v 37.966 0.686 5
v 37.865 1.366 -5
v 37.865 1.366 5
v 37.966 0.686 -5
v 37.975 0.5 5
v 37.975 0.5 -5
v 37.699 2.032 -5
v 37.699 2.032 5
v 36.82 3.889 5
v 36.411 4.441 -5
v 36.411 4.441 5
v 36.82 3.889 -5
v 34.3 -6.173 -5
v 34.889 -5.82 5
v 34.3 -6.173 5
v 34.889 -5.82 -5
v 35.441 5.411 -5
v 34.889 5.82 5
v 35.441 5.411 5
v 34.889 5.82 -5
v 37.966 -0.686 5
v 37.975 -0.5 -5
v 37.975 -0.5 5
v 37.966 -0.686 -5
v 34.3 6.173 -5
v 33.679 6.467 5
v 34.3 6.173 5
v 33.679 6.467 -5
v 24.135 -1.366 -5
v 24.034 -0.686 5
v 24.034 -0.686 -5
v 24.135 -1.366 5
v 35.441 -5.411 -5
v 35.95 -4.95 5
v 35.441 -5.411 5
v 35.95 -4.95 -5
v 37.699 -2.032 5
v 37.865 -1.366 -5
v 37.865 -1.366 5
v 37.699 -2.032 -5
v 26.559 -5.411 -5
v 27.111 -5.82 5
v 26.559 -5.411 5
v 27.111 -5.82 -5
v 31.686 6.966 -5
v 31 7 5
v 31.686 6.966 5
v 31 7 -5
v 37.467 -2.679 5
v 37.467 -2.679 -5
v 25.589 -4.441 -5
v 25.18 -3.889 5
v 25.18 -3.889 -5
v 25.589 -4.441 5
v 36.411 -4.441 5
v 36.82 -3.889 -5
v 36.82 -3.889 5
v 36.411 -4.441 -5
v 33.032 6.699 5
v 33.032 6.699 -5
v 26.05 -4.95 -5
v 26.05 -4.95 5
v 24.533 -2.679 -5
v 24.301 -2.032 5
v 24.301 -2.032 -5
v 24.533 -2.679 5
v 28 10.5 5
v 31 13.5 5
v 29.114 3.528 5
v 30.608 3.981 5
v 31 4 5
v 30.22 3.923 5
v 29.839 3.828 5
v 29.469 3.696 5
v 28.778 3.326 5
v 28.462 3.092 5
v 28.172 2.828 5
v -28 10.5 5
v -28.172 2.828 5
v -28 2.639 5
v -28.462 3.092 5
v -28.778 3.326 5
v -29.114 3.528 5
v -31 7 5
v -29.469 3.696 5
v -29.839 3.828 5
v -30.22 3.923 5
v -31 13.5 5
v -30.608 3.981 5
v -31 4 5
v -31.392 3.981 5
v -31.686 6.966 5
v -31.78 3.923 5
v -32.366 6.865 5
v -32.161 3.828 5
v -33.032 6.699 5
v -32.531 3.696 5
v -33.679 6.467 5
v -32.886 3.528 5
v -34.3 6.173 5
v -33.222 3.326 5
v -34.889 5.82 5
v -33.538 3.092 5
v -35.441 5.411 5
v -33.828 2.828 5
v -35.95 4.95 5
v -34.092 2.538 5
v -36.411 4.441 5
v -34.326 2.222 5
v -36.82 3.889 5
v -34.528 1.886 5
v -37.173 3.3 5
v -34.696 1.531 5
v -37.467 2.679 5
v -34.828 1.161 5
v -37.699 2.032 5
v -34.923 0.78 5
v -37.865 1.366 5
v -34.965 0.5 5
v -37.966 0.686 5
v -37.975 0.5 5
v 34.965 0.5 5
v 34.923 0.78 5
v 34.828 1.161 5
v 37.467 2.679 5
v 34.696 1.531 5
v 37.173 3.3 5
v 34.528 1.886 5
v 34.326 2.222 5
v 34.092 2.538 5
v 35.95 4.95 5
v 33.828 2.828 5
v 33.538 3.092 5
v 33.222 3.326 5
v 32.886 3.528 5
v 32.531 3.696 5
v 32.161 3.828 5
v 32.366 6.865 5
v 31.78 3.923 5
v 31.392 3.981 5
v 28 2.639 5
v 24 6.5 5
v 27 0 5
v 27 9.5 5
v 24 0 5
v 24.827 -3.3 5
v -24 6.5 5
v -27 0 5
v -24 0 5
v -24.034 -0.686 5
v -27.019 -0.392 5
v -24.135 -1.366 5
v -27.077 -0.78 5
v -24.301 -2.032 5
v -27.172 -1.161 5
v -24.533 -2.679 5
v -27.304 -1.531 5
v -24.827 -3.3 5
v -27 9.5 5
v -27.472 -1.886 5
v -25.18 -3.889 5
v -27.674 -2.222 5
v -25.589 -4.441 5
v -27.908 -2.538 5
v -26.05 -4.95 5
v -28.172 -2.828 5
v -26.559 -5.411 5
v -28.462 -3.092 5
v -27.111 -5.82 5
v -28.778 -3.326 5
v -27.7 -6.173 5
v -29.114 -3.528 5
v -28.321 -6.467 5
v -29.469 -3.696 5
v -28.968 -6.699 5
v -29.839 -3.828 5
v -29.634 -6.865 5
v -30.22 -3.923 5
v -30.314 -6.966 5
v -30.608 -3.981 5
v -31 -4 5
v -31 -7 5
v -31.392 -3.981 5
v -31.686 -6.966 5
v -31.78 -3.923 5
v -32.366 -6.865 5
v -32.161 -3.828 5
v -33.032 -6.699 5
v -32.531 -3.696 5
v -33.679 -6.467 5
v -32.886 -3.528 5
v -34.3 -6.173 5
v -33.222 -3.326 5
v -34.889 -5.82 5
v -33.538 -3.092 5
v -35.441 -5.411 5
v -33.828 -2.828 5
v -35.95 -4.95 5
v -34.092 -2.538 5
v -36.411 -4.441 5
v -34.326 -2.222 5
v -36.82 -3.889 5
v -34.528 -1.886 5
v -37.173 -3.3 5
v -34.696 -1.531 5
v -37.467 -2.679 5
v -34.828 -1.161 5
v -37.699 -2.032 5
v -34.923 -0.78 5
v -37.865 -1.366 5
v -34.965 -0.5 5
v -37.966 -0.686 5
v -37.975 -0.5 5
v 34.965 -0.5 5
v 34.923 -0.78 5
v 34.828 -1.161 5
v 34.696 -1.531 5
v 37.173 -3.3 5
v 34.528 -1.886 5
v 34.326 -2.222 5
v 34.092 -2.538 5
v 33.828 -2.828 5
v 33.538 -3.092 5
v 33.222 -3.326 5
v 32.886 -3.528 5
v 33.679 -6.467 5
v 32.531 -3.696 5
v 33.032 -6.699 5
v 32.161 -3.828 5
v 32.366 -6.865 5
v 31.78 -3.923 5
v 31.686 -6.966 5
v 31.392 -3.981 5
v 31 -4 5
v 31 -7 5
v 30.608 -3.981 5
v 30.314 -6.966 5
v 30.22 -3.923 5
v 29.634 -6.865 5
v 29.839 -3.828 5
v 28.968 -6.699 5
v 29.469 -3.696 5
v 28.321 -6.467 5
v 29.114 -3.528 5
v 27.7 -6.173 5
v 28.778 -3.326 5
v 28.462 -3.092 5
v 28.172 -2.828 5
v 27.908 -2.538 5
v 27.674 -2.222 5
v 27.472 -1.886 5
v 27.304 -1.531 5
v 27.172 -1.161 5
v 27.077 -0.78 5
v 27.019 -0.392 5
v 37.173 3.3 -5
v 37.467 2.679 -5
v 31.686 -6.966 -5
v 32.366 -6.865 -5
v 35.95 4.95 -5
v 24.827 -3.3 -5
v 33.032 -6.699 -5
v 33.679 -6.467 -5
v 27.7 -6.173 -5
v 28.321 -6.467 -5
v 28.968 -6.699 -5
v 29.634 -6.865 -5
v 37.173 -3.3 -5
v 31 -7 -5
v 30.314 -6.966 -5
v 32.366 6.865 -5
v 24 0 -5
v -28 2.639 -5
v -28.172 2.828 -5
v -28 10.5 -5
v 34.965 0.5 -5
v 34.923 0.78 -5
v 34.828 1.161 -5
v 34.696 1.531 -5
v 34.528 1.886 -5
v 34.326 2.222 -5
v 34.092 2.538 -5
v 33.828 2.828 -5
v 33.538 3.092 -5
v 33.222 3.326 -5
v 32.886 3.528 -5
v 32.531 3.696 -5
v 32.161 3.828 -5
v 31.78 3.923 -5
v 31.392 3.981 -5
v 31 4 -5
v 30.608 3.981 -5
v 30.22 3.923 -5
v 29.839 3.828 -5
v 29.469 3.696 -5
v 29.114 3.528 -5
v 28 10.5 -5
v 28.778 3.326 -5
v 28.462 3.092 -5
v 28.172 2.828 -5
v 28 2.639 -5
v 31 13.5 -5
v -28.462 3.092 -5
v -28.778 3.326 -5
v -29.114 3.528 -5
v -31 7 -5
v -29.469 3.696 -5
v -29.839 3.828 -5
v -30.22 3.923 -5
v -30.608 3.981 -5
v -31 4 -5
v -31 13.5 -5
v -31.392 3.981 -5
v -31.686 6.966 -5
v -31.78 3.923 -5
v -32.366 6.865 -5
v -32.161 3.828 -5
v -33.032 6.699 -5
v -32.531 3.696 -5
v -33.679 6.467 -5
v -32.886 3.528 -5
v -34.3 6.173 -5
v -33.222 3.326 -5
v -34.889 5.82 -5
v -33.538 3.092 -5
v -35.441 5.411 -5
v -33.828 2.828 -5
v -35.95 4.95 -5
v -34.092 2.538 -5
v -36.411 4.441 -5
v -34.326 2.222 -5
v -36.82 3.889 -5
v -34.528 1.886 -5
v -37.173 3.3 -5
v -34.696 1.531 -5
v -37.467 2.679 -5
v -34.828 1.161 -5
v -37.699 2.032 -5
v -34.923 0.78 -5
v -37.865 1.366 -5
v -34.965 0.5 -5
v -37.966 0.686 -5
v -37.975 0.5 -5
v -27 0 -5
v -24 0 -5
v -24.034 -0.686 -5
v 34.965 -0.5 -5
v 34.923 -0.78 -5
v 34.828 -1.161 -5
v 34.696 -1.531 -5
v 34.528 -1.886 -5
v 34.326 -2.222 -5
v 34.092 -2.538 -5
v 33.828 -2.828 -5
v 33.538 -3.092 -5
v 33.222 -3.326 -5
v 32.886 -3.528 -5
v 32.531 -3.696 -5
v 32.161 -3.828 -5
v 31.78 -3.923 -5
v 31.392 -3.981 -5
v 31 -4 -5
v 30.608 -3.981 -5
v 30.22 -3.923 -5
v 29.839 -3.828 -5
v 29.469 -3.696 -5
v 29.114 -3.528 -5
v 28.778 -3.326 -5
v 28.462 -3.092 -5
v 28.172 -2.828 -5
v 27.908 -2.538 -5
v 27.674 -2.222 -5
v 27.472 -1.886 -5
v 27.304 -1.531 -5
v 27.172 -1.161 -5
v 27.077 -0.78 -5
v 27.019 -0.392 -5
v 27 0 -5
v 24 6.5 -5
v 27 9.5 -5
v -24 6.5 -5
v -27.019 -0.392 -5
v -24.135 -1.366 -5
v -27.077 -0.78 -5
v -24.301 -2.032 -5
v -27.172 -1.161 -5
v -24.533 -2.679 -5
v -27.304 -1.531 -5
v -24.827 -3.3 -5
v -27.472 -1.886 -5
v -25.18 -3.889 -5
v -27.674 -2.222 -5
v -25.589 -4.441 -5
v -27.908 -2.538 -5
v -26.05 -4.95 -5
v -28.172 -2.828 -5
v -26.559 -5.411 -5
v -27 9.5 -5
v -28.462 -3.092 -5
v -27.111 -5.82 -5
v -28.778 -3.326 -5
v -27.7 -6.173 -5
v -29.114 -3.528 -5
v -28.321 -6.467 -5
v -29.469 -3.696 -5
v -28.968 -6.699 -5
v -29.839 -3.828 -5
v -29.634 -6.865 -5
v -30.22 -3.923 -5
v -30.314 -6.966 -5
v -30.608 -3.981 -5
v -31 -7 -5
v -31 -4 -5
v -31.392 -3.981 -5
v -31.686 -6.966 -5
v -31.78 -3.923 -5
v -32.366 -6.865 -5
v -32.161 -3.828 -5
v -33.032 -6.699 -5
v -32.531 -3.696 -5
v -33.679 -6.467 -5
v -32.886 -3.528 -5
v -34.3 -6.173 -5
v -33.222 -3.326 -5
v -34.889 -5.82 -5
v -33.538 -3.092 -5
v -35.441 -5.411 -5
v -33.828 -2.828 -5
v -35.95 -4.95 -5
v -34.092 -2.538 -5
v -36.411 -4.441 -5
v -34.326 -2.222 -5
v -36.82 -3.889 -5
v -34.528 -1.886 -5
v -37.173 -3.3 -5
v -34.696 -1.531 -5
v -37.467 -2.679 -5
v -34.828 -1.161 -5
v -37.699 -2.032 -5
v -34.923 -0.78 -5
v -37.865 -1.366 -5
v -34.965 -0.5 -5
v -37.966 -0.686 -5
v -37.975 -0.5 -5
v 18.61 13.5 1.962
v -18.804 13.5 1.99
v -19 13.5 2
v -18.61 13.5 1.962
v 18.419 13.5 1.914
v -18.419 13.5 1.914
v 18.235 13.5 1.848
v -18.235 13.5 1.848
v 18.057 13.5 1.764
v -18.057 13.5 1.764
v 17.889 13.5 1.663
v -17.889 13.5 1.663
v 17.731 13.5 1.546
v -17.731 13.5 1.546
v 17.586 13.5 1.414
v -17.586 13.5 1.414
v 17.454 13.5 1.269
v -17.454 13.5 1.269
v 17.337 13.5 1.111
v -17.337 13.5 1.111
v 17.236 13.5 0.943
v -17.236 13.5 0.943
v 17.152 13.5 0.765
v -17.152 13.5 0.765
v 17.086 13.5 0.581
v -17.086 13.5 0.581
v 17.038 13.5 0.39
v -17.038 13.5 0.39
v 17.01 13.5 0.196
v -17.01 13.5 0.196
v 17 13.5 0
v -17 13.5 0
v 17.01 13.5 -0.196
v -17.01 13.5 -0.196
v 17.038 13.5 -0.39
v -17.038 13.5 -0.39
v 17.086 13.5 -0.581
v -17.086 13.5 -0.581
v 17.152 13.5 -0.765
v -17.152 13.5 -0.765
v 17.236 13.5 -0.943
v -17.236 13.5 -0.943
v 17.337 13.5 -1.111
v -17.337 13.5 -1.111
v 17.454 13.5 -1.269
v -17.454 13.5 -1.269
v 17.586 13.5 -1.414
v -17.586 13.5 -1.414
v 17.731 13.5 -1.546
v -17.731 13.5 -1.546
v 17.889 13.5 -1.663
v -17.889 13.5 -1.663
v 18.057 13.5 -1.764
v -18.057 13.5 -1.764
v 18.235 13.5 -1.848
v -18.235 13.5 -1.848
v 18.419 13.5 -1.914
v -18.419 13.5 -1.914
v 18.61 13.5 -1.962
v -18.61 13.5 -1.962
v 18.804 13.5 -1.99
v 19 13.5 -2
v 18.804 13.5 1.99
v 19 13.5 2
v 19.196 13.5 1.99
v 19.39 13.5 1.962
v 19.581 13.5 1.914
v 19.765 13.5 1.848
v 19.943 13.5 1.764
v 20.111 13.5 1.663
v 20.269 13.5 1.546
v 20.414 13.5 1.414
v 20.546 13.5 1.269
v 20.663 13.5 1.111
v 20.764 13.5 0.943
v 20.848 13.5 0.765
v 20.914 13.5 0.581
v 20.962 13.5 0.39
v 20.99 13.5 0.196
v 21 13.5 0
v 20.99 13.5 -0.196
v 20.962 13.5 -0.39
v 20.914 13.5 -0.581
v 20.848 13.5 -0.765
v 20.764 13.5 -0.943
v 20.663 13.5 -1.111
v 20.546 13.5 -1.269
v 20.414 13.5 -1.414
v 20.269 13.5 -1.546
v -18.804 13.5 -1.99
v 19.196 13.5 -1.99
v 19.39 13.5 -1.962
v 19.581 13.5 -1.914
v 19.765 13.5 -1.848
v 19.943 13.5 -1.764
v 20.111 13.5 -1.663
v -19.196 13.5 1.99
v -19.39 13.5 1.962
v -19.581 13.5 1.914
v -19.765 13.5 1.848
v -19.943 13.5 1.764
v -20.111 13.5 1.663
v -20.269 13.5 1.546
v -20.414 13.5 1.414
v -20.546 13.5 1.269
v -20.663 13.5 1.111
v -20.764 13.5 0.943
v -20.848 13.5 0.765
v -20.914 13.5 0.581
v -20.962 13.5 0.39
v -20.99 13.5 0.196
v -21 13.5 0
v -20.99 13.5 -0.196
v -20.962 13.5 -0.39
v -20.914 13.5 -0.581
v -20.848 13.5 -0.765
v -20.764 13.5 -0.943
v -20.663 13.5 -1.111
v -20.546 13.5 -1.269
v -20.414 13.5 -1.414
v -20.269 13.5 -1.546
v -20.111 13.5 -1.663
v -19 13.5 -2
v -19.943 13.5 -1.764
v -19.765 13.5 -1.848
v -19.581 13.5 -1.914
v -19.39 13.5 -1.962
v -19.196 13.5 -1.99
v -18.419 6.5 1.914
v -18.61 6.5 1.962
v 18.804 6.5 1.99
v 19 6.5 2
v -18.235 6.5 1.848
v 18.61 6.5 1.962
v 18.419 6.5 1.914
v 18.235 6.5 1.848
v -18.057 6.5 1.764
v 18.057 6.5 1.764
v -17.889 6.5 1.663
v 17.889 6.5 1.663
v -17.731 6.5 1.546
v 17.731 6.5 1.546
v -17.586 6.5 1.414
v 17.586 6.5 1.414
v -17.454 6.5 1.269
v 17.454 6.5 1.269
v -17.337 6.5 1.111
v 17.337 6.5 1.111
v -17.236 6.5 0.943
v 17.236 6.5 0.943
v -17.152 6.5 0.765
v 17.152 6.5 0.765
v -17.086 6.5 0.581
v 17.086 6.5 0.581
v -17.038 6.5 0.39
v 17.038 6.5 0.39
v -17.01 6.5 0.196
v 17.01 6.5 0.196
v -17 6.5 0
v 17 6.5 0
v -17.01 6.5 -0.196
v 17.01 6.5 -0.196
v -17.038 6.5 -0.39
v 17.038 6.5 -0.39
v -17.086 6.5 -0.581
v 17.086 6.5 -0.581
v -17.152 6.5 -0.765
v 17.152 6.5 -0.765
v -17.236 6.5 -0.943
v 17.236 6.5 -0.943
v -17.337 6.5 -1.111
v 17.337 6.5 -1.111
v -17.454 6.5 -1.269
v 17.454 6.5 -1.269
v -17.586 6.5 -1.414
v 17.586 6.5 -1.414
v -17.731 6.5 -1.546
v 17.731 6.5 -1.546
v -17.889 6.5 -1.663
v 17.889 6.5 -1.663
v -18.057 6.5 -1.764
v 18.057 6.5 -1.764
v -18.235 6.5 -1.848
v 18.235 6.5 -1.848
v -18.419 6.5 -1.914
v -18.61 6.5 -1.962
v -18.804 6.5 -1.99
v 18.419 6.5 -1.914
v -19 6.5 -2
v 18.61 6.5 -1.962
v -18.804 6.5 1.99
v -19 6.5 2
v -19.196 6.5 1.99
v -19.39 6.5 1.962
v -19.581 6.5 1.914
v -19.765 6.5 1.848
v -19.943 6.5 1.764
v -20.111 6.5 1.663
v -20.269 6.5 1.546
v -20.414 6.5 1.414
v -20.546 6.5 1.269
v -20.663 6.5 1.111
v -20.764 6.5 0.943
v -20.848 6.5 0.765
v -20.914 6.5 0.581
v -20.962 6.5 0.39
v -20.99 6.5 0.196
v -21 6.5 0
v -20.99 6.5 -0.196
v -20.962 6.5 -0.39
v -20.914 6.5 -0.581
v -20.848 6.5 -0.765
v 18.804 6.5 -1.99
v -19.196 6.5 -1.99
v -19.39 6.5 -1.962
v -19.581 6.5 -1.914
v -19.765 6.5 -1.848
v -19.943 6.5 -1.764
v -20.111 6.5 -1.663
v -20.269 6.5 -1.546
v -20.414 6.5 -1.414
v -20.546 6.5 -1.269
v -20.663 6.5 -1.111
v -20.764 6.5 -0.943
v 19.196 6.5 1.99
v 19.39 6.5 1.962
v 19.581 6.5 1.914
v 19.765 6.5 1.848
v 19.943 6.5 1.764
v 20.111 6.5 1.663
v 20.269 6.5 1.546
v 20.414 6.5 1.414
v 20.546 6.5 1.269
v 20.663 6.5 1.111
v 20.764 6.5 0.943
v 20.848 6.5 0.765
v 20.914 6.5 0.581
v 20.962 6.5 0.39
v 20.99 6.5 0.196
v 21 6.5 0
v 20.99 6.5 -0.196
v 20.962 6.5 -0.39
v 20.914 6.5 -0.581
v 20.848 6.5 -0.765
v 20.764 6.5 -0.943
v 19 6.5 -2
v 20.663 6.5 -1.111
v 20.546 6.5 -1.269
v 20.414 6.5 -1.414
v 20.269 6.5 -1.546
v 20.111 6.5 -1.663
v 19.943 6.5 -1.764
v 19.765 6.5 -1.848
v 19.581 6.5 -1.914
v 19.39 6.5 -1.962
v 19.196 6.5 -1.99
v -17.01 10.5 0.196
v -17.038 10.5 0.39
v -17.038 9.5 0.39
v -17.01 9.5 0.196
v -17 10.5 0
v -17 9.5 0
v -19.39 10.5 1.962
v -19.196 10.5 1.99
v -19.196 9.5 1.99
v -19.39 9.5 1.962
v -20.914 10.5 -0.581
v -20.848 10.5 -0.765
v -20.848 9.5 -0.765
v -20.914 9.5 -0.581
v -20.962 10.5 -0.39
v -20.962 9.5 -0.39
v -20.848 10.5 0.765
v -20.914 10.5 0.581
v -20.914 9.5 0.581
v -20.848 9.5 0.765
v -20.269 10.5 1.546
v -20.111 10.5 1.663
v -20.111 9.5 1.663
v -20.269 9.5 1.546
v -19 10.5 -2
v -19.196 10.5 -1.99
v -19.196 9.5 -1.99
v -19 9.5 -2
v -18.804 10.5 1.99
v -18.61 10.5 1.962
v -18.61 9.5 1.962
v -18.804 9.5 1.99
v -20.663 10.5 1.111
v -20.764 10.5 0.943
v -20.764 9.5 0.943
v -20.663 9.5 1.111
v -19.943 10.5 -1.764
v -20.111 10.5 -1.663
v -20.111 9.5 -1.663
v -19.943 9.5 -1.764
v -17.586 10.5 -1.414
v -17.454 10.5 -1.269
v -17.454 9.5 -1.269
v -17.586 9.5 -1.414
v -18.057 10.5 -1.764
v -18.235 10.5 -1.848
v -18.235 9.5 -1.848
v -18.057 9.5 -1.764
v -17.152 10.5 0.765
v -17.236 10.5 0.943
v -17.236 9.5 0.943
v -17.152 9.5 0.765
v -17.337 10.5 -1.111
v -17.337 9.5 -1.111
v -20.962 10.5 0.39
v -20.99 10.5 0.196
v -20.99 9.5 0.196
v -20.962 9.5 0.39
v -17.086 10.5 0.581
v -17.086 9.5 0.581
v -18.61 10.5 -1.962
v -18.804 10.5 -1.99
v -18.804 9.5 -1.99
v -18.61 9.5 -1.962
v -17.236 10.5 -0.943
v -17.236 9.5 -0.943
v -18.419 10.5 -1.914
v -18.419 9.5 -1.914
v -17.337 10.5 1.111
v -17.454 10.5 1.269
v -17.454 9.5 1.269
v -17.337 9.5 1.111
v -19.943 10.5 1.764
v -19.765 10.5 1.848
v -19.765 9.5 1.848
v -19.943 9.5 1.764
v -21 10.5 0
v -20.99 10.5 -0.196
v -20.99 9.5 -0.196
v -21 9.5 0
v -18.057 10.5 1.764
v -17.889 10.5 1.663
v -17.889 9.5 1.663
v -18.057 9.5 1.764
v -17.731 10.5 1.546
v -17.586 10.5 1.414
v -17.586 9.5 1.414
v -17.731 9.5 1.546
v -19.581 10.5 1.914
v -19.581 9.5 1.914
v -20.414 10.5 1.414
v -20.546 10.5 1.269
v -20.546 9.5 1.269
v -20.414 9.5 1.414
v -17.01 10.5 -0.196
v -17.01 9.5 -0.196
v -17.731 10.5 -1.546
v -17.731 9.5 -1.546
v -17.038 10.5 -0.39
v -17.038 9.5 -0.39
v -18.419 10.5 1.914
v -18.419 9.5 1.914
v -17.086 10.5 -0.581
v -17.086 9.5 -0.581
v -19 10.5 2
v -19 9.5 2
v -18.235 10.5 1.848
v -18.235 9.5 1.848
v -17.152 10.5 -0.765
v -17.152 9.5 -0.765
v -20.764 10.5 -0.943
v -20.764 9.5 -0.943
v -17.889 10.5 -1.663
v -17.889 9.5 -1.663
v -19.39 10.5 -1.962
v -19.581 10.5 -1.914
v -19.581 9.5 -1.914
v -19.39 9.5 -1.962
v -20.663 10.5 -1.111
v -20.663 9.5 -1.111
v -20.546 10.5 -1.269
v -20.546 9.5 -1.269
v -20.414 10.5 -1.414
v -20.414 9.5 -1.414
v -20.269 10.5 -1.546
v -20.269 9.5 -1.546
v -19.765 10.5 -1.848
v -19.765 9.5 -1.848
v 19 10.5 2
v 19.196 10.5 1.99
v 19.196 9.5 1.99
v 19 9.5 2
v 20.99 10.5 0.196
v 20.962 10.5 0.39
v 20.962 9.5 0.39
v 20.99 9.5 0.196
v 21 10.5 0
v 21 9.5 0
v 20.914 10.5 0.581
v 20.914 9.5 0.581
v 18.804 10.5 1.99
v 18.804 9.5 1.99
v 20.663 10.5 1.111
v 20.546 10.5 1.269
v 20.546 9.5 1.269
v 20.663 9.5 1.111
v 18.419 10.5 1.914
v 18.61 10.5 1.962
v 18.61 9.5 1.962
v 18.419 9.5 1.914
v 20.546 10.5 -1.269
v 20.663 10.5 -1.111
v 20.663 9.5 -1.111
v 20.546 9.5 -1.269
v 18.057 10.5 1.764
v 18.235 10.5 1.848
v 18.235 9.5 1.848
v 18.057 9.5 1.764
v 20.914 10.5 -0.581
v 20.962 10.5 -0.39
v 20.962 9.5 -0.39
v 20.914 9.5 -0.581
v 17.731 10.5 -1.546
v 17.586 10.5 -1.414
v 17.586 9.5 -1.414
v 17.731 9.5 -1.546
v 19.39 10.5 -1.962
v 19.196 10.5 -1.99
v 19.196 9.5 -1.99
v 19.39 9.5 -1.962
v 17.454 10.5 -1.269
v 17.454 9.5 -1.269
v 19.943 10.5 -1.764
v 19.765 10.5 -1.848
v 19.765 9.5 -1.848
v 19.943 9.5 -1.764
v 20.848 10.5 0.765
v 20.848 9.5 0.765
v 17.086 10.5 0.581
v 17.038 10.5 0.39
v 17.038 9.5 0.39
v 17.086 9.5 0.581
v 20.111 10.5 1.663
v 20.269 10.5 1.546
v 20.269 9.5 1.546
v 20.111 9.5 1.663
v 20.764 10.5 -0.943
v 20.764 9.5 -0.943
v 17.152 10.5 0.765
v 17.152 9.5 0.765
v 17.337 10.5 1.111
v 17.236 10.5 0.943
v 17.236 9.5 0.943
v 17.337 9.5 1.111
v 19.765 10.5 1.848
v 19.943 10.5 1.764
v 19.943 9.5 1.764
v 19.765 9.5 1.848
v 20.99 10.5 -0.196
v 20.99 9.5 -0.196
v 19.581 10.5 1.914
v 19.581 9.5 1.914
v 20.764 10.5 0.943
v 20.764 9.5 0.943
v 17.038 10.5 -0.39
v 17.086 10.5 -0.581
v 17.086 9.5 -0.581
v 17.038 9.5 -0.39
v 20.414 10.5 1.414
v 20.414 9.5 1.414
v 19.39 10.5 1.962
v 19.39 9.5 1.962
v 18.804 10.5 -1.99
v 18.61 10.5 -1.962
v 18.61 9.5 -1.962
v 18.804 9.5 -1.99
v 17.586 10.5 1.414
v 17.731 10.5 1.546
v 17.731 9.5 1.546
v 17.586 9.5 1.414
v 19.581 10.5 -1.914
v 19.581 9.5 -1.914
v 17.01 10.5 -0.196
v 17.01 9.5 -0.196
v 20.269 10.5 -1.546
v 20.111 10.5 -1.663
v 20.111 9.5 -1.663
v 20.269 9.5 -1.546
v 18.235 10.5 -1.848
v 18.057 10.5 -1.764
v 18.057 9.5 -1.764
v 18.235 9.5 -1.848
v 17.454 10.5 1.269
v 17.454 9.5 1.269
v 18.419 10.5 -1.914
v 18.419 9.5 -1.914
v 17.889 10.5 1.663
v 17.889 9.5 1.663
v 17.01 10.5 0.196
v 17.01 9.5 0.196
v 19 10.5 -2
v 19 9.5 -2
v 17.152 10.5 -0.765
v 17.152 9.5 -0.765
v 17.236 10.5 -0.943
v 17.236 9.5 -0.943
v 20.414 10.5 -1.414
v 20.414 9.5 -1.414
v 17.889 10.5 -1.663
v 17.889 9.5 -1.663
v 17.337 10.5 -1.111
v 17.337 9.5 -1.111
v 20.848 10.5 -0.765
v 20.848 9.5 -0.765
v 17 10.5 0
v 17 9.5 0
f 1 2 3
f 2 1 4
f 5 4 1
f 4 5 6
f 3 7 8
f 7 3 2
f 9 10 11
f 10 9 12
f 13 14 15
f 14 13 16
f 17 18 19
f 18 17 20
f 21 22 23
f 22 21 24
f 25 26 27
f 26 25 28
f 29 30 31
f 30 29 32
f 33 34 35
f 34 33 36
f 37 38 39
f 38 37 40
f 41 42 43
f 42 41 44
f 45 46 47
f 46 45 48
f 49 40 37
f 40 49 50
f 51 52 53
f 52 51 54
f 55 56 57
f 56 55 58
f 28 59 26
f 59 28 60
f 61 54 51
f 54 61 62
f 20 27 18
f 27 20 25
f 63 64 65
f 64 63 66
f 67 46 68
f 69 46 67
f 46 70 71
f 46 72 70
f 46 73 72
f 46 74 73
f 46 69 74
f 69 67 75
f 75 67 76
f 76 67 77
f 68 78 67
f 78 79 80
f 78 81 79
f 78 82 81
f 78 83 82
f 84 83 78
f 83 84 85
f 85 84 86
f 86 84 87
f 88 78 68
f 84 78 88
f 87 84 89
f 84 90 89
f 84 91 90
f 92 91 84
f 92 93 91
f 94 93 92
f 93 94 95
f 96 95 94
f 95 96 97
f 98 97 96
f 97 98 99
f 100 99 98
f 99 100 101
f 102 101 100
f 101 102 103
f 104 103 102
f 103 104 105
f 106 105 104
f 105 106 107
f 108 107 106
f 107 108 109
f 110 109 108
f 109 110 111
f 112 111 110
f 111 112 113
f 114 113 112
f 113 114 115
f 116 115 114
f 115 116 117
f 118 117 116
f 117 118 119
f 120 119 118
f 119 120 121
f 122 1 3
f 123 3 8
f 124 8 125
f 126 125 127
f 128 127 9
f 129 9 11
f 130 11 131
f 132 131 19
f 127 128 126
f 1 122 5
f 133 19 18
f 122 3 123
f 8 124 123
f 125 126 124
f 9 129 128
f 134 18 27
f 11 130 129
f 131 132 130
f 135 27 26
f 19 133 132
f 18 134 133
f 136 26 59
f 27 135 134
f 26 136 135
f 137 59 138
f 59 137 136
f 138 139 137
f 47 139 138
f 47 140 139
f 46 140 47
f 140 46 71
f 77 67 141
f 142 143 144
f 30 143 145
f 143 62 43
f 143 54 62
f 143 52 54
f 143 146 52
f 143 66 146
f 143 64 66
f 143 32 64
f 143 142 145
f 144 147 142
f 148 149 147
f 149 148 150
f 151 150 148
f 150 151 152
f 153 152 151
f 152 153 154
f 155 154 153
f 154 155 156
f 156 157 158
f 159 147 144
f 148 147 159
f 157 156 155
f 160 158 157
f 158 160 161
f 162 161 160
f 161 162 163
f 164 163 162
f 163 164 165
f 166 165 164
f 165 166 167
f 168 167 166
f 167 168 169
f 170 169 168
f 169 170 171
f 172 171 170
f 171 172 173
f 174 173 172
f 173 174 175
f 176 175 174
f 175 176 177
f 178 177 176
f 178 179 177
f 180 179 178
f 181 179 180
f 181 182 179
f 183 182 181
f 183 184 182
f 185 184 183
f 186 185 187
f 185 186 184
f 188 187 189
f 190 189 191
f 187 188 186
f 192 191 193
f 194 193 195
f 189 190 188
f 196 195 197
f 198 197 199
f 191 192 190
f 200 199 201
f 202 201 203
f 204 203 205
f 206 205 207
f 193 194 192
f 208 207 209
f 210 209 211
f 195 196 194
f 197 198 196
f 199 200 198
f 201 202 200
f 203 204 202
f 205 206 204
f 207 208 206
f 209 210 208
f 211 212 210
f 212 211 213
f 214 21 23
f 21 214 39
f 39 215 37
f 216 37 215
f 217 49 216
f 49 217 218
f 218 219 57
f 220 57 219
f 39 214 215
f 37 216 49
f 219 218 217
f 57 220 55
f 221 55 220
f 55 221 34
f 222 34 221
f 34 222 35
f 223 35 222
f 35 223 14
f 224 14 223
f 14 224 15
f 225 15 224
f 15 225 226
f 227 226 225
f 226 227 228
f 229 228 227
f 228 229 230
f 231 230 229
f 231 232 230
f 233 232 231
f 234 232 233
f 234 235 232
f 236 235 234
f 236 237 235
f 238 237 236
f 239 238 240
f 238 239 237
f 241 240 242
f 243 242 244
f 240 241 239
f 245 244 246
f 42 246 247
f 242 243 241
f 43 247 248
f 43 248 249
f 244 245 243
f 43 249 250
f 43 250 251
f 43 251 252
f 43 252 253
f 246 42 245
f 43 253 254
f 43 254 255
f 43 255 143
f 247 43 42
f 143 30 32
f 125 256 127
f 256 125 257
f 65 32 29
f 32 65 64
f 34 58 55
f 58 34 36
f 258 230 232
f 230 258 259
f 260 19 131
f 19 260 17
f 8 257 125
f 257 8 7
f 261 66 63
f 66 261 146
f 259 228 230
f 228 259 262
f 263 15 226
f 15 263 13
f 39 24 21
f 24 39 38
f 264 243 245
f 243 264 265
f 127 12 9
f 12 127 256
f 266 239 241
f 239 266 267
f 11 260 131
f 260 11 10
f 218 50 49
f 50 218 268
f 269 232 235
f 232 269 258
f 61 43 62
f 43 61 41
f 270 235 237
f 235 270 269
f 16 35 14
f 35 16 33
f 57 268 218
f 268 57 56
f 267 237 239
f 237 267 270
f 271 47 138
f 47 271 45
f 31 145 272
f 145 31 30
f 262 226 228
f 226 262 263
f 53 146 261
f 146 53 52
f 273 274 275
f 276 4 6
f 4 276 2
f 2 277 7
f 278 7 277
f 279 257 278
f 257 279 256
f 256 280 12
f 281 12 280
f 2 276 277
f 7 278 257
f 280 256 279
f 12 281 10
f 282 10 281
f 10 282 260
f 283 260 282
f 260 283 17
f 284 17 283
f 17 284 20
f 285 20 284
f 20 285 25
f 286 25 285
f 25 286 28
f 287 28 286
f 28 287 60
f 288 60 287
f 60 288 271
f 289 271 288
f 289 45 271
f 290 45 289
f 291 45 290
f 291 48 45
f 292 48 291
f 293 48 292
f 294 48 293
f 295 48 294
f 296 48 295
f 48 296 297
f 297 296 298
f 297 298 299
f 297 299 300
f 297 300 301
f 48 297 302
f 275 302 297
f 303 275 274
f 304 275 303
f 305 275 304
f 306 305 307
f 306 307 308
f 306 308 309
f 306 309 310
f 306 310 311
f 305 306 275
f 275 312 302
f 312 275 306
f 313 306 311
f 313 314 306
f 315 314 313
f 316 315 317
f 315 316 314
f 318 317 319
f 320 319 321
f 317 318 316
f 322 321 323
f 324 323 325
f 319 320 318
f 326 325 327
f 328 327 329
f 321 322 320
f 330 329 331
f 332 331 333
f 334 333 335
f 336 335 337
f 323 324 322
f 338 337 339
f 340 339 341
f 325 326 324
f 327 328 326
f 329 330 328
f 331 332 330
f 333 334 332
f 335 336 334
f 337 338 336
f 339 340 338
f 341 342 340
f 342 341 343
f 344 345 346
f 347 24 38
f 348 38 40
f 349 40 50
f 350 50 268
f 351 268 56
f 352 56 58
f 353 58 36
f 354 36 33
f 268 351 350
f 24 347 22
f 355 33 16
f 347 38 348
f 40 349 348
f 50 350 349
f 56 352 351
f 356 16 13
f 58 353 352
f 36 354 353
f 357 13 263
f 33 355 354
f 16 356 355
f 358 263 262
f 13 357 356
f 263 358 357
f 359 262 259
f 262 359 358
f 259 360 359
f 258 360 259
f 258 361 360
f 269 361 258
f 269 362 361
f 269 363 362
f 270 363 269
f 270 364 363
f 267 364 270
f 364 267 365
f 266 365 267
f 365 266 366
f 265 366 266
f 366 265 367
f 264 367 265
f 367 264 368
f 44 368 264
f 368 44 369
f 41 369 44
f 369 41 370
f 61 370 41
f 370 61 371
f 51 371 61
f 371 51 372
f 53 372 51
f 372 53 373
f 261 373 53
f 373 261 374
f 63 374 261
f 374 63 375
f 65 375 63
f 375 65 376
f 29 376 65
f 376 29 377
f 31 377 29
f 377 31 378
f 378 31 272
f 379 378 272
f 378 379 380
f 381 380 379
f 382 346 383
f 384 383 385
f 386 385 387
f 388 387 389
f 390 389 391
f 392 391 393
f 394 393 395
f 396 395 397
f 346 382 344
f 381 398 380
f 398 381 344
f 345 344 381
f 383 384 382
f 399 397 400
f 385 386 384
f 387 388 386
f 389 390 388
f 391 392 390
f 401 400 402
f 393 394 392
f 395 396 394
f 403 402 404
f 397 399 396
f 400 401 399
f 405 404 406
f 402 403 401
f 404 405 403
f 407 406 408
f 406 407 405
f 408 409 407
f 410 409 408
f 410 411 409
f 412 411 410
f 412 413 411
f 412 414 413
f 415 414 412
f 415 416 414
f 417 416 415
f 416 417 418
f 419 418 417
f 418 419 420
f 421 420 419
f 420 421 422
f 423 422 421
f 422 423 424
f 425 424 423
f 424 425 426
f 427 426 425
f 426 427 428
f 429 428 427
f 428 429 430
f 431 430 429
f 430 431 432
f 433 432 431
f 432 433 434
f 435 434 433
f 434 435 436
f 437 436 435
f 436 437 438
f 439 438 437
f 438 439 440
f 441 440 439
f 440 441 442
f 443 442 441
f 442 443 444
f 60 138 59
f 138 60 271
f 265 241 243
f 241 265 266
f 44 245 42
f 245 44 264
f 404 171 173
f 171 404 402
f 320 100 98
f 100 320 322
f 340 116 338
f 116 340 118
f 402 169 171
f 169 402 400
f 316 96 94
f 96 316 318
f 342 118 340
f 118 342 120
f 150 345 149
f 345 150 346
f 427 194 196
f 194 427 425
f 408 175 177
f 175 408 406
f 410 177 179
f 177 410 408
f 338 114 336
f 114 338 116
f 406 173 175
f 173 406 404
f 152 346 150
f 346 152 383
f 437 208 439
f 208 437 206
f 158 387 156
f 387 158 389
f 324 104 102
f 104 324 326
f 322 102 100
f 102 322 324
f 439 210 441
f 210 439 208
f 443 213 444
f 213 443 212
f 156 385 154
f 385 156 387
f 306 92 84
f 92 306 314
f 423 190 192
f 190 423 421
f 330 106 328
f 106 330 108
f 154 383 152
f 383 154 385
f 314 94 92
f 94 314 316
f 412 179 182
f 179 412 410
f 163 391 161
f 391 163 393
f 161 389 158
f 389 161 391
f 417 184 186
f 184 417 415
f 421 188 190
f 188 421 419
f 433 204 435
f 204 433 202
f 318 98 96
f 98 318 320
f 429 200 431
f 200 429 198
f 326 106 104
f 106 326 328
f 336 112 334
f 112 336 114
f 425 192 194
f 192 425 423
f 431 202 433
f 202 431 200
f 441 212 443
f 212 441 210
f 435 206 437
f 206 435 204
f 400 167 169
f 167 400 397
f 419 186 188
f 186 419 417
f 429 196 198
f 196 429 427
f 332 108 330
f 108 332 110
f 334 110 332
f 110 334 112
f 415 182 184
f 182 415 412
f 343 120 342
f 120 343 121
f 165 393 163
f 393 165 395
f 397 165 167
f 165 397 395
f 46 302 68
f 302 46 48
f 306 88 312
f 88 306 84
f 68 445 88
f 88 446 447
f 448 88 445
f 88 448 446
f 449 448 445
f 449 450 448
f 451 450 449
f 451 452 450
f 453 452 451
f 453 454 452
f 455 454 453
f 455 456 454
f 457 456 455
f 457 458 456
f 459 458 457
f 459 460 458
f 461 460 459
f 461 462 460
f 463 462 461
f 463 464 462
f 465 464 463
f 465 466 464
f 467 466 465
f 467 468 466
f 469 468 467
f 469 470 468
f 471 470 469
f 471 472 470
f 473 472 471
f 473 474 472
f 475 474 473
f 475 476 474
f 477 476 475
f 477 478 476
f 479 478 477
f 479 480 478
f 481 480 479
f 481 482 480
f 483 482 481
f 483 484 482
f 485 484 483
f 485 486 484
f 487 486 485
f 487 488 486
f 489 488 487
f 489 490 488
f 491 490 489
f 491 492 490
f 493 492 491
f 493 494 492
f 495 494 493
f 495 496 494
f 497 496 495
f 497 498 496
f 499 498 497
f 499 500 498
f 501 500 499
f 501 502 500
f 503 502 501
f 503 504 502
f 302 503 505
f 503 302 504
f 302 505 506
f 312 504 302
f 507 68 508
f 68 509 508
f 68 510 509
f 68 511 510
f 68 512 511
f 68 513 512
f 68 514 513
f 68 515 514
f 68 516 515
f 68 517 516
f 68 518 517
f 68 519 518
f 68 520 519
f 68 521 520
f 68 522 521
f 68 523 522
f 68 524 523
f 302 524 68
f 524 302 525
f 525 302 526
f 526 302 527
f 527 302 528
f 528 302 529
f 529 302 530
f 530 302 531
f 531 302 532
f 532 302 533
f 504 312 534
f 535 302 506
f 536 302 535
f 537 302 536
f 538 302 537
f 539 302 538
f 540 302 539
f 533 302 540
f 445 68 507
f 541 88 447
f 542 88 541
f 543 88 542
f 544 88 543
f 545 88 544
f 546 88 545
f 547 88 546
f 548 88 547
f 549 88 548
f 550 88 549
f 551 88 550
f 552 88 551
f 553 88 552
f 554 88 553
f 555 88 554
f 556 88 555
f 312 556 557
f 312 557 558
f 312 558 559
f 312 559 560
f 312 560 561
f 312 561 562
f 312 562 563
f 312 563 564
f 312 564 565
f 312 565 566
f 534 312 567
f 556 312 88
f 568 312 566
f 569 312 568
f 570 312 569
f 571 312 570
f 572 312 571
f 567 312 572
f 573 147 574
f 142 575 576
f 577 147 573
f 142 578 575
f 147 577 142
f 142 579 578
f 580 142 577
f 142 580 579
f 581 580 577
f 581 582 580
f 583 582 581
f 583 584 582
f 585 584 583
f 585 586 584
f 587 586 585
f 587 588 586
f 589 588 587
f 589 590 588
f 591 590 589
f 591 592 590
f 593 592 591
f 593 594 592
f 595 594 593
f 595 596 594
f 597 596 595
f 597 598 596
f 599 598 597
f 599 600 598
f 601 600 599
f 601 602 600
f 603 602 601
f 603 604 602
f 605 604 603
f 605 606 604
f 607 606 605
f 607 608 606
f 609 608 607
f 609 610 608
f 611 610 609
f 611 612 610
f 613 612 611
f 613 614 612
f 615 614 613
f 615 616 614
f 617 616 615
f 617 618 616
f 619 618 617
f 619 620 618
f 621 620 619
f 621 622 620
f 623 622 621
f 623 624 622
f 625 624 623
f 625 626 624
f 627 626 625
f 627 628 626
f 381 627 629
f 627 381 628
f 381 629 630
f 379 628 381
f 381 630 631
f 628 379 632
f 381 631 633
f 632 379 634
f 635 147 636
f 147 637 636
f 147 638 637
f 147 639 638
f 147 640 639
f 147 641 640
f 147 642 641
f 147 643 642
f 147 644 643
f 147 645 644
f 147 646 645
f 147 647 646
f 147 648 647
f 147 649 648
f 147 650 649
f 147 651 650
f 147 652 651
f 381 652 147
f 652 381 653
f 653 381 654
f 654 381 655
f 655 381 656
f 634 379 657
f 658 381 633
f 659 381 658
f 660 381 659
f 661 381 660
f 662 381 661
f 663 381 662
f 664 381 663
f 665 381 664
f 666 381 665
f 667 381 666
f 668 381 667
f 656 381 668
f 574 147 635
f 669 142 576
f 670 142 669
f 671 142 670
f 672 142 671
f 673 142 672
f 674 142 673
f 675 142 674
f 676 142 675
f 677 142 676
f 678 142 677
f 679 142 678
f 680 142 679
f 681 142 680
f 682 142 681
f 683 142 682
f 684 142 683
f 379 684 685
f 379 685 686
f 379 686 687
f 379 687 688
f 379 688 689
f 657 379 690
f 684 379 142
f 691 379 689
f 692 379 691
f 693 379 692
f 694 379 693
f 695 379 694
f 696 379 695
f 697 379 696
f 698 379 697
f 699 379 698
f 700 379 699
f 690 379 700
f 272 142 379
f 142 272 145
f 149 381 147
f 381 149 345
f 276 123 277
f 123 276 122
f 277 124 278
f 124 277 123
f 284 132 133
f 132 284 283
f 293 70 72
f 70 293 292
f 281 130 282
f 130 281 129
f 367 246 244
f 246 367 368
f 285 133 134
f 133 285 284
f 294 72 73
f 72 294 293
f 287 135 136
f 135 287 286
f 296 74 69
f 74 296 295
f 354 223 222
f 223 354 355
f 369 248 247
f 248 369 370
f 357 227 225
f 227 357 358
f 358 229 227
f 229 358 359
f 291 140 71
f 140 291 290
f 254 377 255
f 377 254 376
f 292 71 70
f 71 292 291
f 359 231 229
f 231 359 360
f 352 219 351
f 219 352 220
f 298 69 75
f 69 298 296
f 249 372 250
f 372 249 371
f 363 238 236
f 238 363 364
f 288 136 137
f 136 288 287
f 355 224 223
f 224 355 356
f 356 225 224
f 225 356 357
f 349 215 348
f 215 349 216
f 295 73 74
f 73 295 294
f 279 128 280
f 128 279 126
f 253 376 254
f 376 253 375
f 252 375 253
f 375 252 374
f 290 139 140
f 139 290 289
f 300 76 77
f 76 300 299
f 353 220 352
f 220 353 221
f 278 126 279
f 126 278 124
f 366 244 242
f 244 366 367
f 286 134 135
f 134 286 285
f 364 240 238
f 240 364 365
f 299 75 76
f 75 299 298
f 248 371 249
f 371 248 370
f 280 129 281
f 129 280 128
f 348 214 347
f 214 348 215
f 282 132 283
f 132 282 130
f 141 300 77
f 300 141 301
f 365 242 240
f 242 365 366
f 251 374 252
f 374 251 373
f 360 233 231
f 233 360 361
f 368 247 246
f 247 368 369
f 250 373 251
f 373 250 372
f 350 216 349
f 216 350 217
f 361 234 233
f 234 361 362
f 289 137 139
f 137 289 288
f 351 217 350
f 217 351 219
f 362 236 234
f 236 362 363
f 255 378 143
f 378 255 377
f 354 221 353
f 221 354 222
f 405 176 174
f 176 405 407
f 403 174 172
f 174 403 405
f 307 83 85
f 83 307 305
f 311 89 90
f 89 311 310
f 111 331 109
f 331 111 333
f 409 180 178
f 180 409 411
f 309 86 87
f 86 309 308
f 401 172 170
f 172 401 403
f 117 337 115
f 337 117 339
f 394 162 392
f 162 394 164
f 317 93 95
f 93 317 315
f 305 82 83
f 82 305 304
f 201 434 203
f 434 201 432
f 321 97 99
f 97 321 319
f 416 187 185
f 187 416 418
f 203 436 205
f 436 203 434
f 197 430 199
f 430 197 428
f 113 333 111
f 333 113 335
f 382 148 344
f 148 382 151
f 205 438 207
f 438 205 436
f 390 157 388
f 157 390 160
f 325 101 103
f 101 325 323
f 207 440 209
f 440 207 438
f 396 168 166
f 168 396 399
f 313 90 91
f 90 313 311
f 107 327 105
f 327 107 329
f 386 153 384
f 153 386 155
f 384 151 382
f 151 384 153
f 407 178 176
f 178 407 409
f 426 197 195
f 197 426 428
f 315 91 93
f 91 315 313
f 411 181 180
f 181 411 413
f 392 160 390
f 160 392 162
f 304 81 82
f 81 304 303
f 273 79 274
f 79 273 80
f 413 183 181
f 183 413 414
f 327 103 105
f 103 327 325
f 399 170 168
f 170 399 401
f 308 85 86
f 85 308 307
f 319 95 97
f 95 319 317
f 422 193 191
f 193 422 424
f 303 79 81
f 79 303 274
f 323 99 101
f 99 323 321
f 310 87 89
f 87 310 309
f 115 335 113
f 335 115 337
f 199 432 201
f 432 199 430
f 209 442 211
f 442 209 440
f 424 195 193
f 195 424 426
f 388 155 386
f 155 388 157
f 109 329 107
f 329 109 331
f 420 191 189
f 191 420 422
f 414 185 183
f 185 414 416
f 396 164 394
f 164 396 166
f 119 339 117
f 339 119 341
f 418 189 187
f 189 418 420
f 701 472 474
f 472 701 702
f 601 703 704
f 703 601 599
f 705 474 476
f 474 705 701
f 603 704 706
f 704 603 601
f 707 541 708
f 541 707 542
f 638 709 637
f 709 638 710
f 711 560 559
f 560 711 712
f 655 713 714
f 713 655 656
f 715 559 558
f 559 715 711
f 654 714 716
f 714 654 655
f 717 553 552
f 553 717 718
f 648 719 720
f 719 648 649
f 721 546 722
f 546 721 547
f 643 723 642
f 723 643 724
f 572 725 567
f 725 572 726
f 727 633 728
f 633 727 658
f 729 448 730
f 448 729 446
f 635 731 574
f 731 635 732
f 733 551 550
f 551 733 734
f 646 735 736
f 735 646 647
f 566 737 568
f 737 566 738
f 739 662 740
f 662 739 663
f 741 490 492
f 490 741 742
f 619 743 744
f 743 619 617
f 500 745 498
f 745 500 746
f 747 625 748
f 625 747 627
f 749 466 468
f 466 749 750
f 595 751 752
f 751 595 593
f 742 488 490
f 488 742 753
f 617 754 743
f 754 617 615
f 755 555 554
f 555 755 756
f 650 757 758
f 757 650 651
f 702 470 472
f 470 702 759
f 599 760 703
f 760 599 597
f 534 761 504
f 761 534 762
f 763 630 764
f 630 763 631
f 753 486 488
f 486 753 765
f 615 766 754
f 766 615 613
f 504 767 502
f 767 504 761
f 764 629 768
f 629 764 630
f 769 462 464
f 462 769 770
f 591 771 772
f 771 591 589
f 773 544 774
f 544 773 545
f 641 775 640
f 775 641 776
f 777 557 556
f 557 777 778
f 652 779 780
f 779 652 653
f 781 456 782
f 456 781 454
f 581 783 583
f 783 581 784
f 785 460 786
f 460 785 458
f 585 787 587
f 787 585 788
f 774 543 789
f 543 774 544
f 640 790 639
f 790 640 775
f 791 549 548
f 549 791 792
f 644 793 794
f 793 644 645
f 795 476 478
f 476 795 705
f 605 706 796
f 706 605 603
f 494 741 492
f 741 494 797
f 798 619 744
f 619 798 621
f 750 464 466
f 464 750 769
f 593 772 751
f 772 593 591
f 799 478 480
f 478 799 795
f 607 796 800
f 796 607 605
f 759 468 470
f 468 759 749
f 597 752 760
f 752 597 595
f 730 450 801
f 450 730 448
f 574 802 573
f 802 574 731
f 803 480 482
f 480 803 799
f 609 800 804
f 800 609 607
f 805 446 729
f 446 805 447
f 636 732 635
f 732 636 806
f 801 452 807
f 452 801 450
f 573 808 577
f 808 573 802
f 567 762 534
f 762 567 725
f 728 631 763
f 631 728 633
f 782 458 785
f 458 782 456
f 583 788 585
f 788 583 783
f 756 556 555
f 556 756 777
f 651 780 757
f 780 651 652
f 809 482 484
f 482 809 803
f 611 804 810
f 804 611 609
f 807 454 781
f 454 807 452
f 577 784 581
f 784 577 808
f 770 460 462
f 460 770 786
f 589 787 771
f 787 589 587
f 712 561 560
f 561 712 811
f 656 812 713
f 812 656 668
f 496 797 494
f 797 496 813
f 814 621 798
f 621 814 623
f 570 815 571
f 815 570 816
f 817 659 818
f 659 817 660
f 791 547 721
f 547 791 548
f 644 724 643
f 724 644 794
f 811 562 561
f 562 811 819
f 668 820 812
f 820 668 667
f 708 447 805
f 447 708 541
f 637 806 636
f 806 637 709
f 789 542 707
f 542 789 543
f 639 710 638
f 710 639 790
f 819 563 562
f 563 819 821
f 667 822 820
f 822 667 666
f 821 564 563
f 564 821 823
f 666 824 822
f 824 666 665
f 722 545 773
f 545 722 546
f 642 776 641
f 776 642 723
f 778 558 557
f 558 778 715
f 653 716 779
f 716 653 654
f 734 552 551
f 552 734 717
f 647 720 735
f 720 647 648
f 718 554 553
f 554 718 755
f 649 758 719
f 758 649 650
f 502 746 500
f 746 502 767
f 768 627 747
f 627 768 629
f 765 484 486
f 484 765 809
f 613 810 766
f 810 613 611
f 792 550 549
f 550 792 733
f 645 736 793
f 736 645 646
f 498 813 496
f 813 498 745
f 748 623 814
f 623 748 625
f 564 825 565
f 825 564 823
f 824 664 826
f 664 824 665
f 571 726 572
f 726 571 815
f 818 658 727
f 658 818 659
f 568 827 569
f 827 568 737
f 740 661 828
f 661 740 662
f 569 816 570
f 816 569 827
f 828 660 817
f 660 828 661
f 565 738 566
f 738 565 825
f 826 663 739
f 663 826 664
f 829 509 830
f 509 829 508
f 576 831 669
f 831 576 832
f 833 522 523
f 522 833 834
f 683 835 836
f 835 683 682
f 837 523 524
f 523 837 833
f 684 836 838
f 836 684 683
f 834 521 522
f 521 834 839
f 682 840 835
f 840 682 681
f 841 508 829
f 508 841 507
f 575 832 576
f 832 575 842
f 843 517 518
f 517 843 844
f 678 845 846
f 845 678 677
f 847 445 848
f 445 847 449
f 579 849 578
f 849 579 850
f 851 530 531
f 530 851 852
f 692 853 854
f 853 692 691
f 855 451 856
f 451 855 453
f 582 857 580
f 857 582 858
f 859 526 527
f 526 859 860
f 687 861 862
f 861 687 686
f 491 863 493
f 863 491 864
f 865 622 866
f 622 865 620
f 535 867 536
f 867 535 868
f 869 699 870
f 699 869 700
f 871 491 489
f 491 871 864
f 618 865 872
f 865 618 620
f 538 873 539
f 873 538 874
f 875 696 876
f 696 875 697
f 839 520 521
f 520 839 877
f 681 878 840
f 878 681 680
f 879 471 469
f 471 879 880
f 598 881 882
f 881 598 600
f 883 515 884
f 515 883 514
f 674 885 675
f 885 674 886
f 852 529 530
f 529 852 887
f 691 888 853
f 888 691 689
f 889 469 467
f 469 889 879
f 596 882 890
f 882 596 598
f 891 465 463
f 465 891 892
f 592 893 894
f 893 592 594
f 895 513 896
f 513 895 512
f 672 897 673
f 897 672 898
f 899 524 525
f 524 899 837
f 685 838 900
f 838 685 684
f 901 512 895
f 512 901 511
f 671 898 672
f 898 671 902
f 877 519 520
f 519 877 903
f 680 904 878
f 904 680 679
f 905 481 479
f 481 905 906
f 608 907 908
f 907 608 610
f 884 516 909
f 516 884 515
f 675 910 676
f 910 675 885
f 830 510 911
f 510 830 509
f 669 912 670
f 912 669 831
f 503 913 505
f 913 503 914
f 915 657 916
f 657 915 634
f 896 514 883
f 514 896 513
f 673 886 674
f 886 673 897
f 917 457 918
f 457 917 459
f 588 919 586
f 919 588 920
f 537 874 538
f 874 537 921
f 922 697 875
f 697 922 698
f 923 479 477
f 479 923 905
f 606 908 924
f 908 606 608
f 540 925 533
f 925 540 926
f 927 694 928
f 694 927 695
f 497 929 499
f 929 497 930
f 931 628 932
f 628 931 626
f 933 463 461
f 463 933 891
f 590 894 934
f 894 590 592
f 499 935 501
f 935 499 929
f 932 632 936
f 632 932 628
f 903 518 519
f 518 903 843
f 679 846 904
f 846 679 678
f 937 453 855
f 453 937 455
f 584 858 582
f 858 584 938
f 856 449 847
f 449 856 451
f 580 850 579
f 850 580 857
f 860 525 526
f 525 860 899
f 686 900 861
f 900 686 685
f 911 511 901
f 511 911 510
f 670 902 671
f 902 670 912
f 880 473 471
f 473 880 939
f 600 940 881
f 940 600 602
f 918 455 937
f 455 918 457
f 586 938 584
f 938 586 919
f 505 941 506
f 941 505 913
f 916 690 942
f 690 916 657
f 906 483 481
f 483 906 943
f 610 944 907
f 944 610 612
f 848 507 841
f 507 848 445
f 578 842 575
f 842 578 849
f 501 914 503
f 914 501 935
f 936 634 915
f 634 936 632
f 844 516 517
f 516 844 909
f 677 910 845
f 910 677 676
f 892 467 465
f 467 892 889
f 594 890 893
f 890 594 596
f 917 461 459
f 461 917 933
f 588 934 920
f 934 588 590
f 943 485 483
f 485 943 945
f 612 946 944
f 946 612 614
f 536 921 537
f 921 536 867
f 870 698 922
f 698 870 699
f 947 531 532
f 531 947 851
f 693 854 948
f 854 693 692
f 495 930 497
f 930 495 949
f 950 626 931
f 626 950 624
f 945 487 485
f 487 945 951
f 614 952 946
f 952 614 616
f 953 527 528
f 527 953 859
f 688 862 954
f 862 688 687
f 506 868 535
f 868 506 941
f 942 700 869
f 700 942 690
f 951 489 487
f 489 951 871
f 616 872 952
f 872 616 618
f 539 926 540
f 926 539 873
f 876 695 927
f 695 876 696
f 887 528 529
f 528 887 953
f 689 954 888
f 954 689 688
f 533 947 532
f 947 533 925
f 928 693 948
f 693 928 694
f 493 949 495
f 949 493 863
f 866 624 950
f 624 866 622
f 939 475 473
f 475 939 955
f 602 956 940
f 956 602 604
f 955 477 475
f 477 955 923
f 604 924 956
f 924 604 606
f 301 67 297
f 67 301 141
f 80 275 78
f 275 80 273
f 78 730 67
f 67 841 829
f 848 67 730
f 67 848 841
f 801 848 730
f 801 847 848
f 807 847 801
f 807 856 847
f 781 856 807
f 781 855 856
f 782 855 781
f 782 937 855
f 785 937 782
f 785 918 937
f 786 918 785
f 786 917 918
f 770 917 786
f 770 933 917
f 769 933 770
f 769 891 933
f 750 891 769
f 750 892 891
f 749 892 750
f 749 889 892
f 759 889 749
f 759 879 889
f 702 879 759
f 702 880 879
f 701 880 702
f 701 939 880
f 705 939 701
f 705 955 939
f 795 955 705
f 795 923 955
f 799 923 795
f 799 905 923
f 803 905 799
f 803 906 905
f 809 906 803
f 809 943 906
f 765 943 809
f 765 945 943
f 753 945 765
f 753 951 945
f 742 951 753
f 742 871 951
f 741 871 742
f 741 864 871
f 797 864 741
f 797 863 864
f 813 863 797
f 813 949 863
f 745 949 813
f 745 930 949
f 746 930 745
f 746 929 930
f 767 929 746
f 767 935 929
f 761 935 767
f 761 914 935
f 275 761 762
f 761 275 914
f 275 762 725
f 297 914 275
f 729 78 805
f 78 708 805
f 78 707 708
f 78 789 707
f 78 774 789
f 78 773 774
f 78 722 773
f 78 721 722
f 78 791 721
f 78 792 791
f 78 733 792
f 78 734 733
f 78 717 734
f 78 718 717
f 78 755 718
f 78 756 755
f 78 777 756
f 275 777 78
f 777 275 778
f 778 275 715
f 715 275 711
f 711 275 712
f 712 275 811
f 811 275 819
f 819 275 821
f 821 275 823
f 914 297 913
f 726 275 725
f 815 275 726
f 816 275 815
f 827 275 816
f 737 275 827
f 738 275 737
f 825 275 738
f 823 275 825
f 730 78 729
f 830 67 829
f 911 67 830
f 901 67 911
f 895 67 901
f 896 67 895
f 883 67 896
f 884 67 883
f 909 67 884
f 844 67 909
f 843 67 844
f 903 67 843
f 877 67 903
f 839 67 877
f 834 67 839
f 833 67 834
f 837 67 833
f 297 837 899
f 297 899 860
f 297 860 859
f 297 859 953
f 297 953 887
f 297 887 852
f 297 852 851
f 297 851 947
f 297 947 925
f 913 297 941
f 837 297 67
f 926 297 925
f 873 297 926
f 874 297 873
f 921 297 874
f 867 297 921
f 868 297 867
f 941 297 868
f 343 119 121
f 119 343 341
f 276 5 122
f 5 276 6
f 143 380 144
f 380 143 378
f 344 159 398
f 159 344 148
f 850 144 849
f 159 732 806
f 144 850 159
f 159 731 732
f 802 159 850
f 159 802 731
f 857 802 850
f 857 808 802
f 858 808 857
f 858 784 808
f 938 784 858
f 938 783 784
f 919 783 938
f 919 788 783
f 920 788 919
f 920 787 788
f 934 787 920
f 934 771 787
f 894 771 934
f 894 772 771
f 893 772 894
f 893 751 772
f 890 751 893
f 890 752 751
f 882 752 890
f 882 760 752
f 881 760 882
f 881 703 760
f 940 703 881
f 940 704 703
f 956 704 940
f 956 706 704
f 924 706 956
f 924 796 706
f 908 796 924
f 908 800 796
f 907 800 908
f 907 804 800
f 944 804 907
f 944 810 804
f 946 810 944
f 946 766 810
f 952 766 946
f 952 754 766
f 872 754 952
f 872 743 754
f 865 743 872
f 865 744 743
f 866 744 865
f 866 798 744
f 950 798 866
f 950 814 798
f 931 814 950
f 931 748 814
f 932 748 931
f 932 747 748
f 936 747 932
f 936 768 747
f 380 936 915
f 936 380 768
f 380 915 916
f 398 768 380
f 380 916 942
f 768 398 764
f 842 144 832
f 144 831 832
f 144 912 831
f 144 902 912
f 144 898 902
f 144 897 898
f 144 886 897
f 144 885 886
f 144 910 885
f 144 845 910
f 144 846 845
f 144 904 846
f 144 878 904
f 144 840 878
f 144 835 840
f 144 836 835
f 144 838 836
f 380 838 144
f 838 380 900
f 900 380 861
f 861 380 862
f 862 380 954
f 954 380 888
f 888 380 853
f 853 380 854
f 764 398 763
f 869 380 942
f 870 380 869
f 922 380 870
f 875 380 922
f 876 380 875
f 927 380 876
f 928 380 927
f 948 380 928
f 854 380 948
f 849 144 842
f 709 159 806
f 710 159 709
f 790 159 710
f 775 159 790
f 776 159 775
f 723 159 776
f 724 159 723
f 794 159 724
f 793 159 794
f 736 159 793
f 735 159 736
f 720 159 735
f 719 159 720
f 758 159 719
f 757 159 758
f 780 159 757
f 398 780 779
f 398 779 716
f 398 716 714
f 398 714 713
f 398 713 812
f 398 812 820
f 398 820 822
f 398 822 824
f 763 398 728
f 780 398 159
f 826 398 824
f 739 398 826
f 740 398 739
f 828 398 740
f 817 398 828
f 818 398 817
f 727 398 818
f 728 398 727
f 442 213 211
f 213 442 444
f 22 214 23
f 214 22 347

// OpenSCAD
part = "two_halves"; // [bigger,smaller,two_halves, main_pump_holder,filter_pump_holder,pcb_holder]
rod_diameter=8;
rods_distance=62;
offset=10;
mount_hole=4;
mount_hole_distance=38;
part_width=10;
part_thickness=3;
air_gap=1;
pcb_angle=15;
pcb_holes_distance=81;
extra_room=6;
$fn=$preview?32:64;
module whole(){
    translate([rods_distance/2,0,0])cylinder(d=rod_diameter+2*part_thickness, h=part_width, center=true);
             translate([-rods_distance/2,0,0])cylinder(d=rod_diameter+2*part_thickness, h=part_width, center=true);
     translate([0,offset,0])cube([rods_distance-rod_diameter+2*part_thickness+2*air_gap,2*part_thickness+air_gap,part_width],center=true);
       translate([rods_distance/2-rod_diameter/2+air_gap/2,(offset-part_thickness-air_gap/2)/2,0])cube([2*part_thickness+air_gap,offset-part_thickness-air_gap/2,part_width],center=true);
      translate([-rods_distance/2+rod_diameter/2-air_gap/2,(offset-part_thickness-air_gap/2)/2,0])cube([2*part_thickness+air_gap,offset-part_thickness-air_gap/2,part_width],center=true);
    }
module holes(){
    translate([rods_distance/2,0,0])cylinder(d=rod_diameter,h=part_width+2,center=true);
    translate([-rods_distance/2,0,0])cylinder(d=rod_diameter,h=part_width+2,center=true);
    translate([-mount_hole_distance/2,offset,0])rotate([90,0,0])cylinder(d=mount_hole, h=2*part_thickness+air_gap+2, center=true);         
             translate([mount_hole_distance/2,offset,0])rotate([90,0,0])cylinder(d=mount_hole, h=2*part_thickness+air_gap+2, center=true);
    }
module bigger() {
    difference(){
        whole();
        holes();
        cutter(air_gap);
        }
}
module smaller() {
    intersection(){
    difference(){
        whole();
        holes();
        }
        cutter(0);
    }
}
module cutter(gap){
    translate([(rod_diameter-rods_distance)/2-gap,-rod_diameter/2-part_thickness,-part_width/2-1])cube([rods_distance-rod_diameter+2*gap,part_thickness+rod_diameter/2+offset-air_gap/2+gap,part_width+2]);
    translate([-(rods_distance+rod_diameter+2*part_thickness)/2-1,-rod_diameter/2-part_thickness,-part_width/2-1])cube([rods_distance+rod_diameter+2*part_thickness+2,part_thickness+rod_diameter/2-air_gap/2+gap,part_width+2]);
    translate([rods_distance/2-rod_diameter/2,-rod_diameter/2-max(0,air_gap/2-offset),-(part_width+2)/2])cube([rod_diameter/2,rod_diameter/2,part_width+2]);
    translate([-rods_distance/2,-rod_diameter/2-max(0,air_gap/2-offset),-(part_width+2)/2])cube([rod_diameter/2,rod_diameter/2,part_width+2]);
}
module divider(gap)
{
    translate([0,offset-part_thickness-gap/2,0])cube([rods_distance-rod_diameter,2*part_thickness+air_gap,part_width],center=true);
    cube([rods_distance-rod_diameter,2*offset,part_width],center=true);
    }
module pumpholes(){
  translate([rods_distance/2,0,0])circle(d=rod_diameter);
  translate([-rods_distance/2,0,0])circle(d=rod_diameter);
  translate([0,10])rotate([0,0,-50]){
    translate([31,0])circle(d=4);
  translate([-21,0])circle(d=4);
  translate([0,0])circle(d=34);
    }
  }

module pump() {
pumpmounts=[[21,0],[-31,0]];
rodmounts=[[rods_distance/2,0],[-rods_distance/2,0]];
shift=[5,-6];
rotation=40;
pumpdiameter=34;
difference()
{
  union() {
    hull() {
      translate(shift)rotate([0,0,rotation])for (i=pumpmounts) translate(i)cylinder(h=part_width,d=mount_hole+2*part_thickness,center=true);      
      for (i=rodmounts) translate(i)cylinder(h=part_width,d=rod_diameter+2*part_thickness,center=true);
      translate(shift)rotate([0,0,rotation])cylinder(h=part_width,d=pumpdiameter+2*part_thickness,center=true);
    }
    translate(shift)rotate([0,0,rotation])for (i=pumpmounts) translate(i)translate([0,0,offset/2])cylinder(h=part_width+offset,d=mount_hole+2*part_thickness,center=true);
  }
    translate(shift)rotate([0,0,rotation])for (i=pumpmounts) translate(i)cylinder(h=part_width+2*offset+0.02,d=mount_hole,center=true);
    for (i=rodmounts) translate(i)cylinder(h=part_width+0.02,d=rod_diameter,center=true);
    translate(shift)rotate([0,0,rotation])cylinder(h=part_width+2*offset+0.02,d=pumpdiameter,center=true);  
    cube([2*rods_distance,air_gap,part_width+2],center=true);
    #translate([-20,8,0])rotate([90,0,0])cylinder (d=4,h=30,center=true);
}

  *difference(){
    union(){
      linear_extrude(part_width)  offset(r=part_thickness+air_gap)translate([0,10])rotate([0,0,-50]){
    translate([31,0])circle(d=4);
  translate([-21,0])circle(d=4);
    }
 linear_extrude(part_width,center=true)hull()offset(r=part_thickness+air_gap)pumpholes();
    }
linear_extrude(2*part_width+2,center=true)offset(r=0)pumpholes();
    cube([2*rods_distance,air_gap,part_width+2],center=true);
    translate([30,12,0])rotate([90,0,-40])cylinder (d=4,h=30);
    translate([-20,8,0])rotate([90,0,-15])cylinder (d=4,h=20);
  }
}
module filterpump() {
  difference(){
    linear_extrude(part_width)difference(){
        offset (r=part_thickness) hull() {
      circle(d=34);
      translate([17,-9])circle(d=8);
      translate([17,9])circle(d=8);
      translate([-17,-9])circle(d=8);
      translate([-17,9])circle(d=8);
      translate([rods_distance/2,9])circle(d=rod_diameter);
      translate([-rods_distance/2,9])circle(d=rod_diameter);
    }
    hull() {
      circle(d=34);
      translate([17,-9])circle(d=8);
      translate([17,9])circle(d=8);
      translate([-17,-9])circle(d=8);
      translate([-17,9])circle(d=8);
    }
    translate([rods_distance/2,9])circle(d=rod_diameter);
    translate([-rods_distance/2,9])circle(d=rod_diameter);
    translate([0,9])square([2*rods_distance,1],center=true);
  }  
  translate([rods_distance/2-rod_diameter/2-3,0,part_width/2])rotate([90,0,0])cylinder(d=4,h=rods_distance,center=true);  
  translate([-rods_distance/2+rod_diameter/2+3,0,part_width/2])rotate([90,0,0])cylinder(d=4,h=rods_distance,center=true);
}}
module pcbholder() {
  difference() {
    linear_extrude(part_width,convexity=3){
      difference(){
        union() {
          hull() {
            circle(d=part_thickness*2+air_gap);
            rotate(pcb_angle)translate([-rods_distance,0])circle(d=part_thickness*2+air_gap);
          }
        translate([0,-part_thickness-air_gap/2])square([pcb_holes_distance+rod_diameter/2+part_thickness+2*extra_room,2*part_thickness+air_gap]); 
        circle(d=part_thickness*2+air_gap+rod_diameter);
        rotate(pcb_angle)translate([-rods_distance,0])circle(d=part_thickness*2+air_gap+rod_diameter);
        }        
        hull() {
          circle(d=air_gap);
          rotate(pcb_angle)translate([-rods_distance-rod_diameter-part_thickness,0])circle(d=air_gap);
          }
        translate([0,-air_gap/2])square([pcb_holes_distance+rod_diameter/2+part_thickness+2*extra_room,air_gap]); 
        circle(d=rod_diameter);
        rotate(pcb_angle)translate([-rods_distance,0])circle(d=rod_diameter);
      } 
    }
    translate([rod_diameter/2+part_thickness+extra_room,0,part_width/2])rotate([90,0,0])cylinder(d=mount_hole,h=2*part_thickness+2*air_gap,center=true);
    translate([pcb_holes_distance+rod_diameter/2+part_thickness+extra_room,0,part_width/2])rotate([90,0,0])cylinder(d=mount_hole,h=2*part_thickness+2*air_gap,center=true);
    rotate([0,0,pcb_angle])translate([-rods_distance/2,0,part_width/2])rotate([90,0,0])cylinder(d=mount_hole,h=2*part_thickness+2*air_gap,center=true);
  }
}
if (part=="test") {
    difference(){whole();holes();}
}
if (part=="bigger") {
bigger();
}
if (part=="smaller") {
    smaller();
}
if (part=="two_halves")
{
    bigger();
    smaller();
    }
if (part=="main_pump_holder")
{
    pump();
    }
if (part=="filter_pump_holder")
{
    filterpump();
    }
if (part=="pcb_holder")
{
    pcbholder();
    }
